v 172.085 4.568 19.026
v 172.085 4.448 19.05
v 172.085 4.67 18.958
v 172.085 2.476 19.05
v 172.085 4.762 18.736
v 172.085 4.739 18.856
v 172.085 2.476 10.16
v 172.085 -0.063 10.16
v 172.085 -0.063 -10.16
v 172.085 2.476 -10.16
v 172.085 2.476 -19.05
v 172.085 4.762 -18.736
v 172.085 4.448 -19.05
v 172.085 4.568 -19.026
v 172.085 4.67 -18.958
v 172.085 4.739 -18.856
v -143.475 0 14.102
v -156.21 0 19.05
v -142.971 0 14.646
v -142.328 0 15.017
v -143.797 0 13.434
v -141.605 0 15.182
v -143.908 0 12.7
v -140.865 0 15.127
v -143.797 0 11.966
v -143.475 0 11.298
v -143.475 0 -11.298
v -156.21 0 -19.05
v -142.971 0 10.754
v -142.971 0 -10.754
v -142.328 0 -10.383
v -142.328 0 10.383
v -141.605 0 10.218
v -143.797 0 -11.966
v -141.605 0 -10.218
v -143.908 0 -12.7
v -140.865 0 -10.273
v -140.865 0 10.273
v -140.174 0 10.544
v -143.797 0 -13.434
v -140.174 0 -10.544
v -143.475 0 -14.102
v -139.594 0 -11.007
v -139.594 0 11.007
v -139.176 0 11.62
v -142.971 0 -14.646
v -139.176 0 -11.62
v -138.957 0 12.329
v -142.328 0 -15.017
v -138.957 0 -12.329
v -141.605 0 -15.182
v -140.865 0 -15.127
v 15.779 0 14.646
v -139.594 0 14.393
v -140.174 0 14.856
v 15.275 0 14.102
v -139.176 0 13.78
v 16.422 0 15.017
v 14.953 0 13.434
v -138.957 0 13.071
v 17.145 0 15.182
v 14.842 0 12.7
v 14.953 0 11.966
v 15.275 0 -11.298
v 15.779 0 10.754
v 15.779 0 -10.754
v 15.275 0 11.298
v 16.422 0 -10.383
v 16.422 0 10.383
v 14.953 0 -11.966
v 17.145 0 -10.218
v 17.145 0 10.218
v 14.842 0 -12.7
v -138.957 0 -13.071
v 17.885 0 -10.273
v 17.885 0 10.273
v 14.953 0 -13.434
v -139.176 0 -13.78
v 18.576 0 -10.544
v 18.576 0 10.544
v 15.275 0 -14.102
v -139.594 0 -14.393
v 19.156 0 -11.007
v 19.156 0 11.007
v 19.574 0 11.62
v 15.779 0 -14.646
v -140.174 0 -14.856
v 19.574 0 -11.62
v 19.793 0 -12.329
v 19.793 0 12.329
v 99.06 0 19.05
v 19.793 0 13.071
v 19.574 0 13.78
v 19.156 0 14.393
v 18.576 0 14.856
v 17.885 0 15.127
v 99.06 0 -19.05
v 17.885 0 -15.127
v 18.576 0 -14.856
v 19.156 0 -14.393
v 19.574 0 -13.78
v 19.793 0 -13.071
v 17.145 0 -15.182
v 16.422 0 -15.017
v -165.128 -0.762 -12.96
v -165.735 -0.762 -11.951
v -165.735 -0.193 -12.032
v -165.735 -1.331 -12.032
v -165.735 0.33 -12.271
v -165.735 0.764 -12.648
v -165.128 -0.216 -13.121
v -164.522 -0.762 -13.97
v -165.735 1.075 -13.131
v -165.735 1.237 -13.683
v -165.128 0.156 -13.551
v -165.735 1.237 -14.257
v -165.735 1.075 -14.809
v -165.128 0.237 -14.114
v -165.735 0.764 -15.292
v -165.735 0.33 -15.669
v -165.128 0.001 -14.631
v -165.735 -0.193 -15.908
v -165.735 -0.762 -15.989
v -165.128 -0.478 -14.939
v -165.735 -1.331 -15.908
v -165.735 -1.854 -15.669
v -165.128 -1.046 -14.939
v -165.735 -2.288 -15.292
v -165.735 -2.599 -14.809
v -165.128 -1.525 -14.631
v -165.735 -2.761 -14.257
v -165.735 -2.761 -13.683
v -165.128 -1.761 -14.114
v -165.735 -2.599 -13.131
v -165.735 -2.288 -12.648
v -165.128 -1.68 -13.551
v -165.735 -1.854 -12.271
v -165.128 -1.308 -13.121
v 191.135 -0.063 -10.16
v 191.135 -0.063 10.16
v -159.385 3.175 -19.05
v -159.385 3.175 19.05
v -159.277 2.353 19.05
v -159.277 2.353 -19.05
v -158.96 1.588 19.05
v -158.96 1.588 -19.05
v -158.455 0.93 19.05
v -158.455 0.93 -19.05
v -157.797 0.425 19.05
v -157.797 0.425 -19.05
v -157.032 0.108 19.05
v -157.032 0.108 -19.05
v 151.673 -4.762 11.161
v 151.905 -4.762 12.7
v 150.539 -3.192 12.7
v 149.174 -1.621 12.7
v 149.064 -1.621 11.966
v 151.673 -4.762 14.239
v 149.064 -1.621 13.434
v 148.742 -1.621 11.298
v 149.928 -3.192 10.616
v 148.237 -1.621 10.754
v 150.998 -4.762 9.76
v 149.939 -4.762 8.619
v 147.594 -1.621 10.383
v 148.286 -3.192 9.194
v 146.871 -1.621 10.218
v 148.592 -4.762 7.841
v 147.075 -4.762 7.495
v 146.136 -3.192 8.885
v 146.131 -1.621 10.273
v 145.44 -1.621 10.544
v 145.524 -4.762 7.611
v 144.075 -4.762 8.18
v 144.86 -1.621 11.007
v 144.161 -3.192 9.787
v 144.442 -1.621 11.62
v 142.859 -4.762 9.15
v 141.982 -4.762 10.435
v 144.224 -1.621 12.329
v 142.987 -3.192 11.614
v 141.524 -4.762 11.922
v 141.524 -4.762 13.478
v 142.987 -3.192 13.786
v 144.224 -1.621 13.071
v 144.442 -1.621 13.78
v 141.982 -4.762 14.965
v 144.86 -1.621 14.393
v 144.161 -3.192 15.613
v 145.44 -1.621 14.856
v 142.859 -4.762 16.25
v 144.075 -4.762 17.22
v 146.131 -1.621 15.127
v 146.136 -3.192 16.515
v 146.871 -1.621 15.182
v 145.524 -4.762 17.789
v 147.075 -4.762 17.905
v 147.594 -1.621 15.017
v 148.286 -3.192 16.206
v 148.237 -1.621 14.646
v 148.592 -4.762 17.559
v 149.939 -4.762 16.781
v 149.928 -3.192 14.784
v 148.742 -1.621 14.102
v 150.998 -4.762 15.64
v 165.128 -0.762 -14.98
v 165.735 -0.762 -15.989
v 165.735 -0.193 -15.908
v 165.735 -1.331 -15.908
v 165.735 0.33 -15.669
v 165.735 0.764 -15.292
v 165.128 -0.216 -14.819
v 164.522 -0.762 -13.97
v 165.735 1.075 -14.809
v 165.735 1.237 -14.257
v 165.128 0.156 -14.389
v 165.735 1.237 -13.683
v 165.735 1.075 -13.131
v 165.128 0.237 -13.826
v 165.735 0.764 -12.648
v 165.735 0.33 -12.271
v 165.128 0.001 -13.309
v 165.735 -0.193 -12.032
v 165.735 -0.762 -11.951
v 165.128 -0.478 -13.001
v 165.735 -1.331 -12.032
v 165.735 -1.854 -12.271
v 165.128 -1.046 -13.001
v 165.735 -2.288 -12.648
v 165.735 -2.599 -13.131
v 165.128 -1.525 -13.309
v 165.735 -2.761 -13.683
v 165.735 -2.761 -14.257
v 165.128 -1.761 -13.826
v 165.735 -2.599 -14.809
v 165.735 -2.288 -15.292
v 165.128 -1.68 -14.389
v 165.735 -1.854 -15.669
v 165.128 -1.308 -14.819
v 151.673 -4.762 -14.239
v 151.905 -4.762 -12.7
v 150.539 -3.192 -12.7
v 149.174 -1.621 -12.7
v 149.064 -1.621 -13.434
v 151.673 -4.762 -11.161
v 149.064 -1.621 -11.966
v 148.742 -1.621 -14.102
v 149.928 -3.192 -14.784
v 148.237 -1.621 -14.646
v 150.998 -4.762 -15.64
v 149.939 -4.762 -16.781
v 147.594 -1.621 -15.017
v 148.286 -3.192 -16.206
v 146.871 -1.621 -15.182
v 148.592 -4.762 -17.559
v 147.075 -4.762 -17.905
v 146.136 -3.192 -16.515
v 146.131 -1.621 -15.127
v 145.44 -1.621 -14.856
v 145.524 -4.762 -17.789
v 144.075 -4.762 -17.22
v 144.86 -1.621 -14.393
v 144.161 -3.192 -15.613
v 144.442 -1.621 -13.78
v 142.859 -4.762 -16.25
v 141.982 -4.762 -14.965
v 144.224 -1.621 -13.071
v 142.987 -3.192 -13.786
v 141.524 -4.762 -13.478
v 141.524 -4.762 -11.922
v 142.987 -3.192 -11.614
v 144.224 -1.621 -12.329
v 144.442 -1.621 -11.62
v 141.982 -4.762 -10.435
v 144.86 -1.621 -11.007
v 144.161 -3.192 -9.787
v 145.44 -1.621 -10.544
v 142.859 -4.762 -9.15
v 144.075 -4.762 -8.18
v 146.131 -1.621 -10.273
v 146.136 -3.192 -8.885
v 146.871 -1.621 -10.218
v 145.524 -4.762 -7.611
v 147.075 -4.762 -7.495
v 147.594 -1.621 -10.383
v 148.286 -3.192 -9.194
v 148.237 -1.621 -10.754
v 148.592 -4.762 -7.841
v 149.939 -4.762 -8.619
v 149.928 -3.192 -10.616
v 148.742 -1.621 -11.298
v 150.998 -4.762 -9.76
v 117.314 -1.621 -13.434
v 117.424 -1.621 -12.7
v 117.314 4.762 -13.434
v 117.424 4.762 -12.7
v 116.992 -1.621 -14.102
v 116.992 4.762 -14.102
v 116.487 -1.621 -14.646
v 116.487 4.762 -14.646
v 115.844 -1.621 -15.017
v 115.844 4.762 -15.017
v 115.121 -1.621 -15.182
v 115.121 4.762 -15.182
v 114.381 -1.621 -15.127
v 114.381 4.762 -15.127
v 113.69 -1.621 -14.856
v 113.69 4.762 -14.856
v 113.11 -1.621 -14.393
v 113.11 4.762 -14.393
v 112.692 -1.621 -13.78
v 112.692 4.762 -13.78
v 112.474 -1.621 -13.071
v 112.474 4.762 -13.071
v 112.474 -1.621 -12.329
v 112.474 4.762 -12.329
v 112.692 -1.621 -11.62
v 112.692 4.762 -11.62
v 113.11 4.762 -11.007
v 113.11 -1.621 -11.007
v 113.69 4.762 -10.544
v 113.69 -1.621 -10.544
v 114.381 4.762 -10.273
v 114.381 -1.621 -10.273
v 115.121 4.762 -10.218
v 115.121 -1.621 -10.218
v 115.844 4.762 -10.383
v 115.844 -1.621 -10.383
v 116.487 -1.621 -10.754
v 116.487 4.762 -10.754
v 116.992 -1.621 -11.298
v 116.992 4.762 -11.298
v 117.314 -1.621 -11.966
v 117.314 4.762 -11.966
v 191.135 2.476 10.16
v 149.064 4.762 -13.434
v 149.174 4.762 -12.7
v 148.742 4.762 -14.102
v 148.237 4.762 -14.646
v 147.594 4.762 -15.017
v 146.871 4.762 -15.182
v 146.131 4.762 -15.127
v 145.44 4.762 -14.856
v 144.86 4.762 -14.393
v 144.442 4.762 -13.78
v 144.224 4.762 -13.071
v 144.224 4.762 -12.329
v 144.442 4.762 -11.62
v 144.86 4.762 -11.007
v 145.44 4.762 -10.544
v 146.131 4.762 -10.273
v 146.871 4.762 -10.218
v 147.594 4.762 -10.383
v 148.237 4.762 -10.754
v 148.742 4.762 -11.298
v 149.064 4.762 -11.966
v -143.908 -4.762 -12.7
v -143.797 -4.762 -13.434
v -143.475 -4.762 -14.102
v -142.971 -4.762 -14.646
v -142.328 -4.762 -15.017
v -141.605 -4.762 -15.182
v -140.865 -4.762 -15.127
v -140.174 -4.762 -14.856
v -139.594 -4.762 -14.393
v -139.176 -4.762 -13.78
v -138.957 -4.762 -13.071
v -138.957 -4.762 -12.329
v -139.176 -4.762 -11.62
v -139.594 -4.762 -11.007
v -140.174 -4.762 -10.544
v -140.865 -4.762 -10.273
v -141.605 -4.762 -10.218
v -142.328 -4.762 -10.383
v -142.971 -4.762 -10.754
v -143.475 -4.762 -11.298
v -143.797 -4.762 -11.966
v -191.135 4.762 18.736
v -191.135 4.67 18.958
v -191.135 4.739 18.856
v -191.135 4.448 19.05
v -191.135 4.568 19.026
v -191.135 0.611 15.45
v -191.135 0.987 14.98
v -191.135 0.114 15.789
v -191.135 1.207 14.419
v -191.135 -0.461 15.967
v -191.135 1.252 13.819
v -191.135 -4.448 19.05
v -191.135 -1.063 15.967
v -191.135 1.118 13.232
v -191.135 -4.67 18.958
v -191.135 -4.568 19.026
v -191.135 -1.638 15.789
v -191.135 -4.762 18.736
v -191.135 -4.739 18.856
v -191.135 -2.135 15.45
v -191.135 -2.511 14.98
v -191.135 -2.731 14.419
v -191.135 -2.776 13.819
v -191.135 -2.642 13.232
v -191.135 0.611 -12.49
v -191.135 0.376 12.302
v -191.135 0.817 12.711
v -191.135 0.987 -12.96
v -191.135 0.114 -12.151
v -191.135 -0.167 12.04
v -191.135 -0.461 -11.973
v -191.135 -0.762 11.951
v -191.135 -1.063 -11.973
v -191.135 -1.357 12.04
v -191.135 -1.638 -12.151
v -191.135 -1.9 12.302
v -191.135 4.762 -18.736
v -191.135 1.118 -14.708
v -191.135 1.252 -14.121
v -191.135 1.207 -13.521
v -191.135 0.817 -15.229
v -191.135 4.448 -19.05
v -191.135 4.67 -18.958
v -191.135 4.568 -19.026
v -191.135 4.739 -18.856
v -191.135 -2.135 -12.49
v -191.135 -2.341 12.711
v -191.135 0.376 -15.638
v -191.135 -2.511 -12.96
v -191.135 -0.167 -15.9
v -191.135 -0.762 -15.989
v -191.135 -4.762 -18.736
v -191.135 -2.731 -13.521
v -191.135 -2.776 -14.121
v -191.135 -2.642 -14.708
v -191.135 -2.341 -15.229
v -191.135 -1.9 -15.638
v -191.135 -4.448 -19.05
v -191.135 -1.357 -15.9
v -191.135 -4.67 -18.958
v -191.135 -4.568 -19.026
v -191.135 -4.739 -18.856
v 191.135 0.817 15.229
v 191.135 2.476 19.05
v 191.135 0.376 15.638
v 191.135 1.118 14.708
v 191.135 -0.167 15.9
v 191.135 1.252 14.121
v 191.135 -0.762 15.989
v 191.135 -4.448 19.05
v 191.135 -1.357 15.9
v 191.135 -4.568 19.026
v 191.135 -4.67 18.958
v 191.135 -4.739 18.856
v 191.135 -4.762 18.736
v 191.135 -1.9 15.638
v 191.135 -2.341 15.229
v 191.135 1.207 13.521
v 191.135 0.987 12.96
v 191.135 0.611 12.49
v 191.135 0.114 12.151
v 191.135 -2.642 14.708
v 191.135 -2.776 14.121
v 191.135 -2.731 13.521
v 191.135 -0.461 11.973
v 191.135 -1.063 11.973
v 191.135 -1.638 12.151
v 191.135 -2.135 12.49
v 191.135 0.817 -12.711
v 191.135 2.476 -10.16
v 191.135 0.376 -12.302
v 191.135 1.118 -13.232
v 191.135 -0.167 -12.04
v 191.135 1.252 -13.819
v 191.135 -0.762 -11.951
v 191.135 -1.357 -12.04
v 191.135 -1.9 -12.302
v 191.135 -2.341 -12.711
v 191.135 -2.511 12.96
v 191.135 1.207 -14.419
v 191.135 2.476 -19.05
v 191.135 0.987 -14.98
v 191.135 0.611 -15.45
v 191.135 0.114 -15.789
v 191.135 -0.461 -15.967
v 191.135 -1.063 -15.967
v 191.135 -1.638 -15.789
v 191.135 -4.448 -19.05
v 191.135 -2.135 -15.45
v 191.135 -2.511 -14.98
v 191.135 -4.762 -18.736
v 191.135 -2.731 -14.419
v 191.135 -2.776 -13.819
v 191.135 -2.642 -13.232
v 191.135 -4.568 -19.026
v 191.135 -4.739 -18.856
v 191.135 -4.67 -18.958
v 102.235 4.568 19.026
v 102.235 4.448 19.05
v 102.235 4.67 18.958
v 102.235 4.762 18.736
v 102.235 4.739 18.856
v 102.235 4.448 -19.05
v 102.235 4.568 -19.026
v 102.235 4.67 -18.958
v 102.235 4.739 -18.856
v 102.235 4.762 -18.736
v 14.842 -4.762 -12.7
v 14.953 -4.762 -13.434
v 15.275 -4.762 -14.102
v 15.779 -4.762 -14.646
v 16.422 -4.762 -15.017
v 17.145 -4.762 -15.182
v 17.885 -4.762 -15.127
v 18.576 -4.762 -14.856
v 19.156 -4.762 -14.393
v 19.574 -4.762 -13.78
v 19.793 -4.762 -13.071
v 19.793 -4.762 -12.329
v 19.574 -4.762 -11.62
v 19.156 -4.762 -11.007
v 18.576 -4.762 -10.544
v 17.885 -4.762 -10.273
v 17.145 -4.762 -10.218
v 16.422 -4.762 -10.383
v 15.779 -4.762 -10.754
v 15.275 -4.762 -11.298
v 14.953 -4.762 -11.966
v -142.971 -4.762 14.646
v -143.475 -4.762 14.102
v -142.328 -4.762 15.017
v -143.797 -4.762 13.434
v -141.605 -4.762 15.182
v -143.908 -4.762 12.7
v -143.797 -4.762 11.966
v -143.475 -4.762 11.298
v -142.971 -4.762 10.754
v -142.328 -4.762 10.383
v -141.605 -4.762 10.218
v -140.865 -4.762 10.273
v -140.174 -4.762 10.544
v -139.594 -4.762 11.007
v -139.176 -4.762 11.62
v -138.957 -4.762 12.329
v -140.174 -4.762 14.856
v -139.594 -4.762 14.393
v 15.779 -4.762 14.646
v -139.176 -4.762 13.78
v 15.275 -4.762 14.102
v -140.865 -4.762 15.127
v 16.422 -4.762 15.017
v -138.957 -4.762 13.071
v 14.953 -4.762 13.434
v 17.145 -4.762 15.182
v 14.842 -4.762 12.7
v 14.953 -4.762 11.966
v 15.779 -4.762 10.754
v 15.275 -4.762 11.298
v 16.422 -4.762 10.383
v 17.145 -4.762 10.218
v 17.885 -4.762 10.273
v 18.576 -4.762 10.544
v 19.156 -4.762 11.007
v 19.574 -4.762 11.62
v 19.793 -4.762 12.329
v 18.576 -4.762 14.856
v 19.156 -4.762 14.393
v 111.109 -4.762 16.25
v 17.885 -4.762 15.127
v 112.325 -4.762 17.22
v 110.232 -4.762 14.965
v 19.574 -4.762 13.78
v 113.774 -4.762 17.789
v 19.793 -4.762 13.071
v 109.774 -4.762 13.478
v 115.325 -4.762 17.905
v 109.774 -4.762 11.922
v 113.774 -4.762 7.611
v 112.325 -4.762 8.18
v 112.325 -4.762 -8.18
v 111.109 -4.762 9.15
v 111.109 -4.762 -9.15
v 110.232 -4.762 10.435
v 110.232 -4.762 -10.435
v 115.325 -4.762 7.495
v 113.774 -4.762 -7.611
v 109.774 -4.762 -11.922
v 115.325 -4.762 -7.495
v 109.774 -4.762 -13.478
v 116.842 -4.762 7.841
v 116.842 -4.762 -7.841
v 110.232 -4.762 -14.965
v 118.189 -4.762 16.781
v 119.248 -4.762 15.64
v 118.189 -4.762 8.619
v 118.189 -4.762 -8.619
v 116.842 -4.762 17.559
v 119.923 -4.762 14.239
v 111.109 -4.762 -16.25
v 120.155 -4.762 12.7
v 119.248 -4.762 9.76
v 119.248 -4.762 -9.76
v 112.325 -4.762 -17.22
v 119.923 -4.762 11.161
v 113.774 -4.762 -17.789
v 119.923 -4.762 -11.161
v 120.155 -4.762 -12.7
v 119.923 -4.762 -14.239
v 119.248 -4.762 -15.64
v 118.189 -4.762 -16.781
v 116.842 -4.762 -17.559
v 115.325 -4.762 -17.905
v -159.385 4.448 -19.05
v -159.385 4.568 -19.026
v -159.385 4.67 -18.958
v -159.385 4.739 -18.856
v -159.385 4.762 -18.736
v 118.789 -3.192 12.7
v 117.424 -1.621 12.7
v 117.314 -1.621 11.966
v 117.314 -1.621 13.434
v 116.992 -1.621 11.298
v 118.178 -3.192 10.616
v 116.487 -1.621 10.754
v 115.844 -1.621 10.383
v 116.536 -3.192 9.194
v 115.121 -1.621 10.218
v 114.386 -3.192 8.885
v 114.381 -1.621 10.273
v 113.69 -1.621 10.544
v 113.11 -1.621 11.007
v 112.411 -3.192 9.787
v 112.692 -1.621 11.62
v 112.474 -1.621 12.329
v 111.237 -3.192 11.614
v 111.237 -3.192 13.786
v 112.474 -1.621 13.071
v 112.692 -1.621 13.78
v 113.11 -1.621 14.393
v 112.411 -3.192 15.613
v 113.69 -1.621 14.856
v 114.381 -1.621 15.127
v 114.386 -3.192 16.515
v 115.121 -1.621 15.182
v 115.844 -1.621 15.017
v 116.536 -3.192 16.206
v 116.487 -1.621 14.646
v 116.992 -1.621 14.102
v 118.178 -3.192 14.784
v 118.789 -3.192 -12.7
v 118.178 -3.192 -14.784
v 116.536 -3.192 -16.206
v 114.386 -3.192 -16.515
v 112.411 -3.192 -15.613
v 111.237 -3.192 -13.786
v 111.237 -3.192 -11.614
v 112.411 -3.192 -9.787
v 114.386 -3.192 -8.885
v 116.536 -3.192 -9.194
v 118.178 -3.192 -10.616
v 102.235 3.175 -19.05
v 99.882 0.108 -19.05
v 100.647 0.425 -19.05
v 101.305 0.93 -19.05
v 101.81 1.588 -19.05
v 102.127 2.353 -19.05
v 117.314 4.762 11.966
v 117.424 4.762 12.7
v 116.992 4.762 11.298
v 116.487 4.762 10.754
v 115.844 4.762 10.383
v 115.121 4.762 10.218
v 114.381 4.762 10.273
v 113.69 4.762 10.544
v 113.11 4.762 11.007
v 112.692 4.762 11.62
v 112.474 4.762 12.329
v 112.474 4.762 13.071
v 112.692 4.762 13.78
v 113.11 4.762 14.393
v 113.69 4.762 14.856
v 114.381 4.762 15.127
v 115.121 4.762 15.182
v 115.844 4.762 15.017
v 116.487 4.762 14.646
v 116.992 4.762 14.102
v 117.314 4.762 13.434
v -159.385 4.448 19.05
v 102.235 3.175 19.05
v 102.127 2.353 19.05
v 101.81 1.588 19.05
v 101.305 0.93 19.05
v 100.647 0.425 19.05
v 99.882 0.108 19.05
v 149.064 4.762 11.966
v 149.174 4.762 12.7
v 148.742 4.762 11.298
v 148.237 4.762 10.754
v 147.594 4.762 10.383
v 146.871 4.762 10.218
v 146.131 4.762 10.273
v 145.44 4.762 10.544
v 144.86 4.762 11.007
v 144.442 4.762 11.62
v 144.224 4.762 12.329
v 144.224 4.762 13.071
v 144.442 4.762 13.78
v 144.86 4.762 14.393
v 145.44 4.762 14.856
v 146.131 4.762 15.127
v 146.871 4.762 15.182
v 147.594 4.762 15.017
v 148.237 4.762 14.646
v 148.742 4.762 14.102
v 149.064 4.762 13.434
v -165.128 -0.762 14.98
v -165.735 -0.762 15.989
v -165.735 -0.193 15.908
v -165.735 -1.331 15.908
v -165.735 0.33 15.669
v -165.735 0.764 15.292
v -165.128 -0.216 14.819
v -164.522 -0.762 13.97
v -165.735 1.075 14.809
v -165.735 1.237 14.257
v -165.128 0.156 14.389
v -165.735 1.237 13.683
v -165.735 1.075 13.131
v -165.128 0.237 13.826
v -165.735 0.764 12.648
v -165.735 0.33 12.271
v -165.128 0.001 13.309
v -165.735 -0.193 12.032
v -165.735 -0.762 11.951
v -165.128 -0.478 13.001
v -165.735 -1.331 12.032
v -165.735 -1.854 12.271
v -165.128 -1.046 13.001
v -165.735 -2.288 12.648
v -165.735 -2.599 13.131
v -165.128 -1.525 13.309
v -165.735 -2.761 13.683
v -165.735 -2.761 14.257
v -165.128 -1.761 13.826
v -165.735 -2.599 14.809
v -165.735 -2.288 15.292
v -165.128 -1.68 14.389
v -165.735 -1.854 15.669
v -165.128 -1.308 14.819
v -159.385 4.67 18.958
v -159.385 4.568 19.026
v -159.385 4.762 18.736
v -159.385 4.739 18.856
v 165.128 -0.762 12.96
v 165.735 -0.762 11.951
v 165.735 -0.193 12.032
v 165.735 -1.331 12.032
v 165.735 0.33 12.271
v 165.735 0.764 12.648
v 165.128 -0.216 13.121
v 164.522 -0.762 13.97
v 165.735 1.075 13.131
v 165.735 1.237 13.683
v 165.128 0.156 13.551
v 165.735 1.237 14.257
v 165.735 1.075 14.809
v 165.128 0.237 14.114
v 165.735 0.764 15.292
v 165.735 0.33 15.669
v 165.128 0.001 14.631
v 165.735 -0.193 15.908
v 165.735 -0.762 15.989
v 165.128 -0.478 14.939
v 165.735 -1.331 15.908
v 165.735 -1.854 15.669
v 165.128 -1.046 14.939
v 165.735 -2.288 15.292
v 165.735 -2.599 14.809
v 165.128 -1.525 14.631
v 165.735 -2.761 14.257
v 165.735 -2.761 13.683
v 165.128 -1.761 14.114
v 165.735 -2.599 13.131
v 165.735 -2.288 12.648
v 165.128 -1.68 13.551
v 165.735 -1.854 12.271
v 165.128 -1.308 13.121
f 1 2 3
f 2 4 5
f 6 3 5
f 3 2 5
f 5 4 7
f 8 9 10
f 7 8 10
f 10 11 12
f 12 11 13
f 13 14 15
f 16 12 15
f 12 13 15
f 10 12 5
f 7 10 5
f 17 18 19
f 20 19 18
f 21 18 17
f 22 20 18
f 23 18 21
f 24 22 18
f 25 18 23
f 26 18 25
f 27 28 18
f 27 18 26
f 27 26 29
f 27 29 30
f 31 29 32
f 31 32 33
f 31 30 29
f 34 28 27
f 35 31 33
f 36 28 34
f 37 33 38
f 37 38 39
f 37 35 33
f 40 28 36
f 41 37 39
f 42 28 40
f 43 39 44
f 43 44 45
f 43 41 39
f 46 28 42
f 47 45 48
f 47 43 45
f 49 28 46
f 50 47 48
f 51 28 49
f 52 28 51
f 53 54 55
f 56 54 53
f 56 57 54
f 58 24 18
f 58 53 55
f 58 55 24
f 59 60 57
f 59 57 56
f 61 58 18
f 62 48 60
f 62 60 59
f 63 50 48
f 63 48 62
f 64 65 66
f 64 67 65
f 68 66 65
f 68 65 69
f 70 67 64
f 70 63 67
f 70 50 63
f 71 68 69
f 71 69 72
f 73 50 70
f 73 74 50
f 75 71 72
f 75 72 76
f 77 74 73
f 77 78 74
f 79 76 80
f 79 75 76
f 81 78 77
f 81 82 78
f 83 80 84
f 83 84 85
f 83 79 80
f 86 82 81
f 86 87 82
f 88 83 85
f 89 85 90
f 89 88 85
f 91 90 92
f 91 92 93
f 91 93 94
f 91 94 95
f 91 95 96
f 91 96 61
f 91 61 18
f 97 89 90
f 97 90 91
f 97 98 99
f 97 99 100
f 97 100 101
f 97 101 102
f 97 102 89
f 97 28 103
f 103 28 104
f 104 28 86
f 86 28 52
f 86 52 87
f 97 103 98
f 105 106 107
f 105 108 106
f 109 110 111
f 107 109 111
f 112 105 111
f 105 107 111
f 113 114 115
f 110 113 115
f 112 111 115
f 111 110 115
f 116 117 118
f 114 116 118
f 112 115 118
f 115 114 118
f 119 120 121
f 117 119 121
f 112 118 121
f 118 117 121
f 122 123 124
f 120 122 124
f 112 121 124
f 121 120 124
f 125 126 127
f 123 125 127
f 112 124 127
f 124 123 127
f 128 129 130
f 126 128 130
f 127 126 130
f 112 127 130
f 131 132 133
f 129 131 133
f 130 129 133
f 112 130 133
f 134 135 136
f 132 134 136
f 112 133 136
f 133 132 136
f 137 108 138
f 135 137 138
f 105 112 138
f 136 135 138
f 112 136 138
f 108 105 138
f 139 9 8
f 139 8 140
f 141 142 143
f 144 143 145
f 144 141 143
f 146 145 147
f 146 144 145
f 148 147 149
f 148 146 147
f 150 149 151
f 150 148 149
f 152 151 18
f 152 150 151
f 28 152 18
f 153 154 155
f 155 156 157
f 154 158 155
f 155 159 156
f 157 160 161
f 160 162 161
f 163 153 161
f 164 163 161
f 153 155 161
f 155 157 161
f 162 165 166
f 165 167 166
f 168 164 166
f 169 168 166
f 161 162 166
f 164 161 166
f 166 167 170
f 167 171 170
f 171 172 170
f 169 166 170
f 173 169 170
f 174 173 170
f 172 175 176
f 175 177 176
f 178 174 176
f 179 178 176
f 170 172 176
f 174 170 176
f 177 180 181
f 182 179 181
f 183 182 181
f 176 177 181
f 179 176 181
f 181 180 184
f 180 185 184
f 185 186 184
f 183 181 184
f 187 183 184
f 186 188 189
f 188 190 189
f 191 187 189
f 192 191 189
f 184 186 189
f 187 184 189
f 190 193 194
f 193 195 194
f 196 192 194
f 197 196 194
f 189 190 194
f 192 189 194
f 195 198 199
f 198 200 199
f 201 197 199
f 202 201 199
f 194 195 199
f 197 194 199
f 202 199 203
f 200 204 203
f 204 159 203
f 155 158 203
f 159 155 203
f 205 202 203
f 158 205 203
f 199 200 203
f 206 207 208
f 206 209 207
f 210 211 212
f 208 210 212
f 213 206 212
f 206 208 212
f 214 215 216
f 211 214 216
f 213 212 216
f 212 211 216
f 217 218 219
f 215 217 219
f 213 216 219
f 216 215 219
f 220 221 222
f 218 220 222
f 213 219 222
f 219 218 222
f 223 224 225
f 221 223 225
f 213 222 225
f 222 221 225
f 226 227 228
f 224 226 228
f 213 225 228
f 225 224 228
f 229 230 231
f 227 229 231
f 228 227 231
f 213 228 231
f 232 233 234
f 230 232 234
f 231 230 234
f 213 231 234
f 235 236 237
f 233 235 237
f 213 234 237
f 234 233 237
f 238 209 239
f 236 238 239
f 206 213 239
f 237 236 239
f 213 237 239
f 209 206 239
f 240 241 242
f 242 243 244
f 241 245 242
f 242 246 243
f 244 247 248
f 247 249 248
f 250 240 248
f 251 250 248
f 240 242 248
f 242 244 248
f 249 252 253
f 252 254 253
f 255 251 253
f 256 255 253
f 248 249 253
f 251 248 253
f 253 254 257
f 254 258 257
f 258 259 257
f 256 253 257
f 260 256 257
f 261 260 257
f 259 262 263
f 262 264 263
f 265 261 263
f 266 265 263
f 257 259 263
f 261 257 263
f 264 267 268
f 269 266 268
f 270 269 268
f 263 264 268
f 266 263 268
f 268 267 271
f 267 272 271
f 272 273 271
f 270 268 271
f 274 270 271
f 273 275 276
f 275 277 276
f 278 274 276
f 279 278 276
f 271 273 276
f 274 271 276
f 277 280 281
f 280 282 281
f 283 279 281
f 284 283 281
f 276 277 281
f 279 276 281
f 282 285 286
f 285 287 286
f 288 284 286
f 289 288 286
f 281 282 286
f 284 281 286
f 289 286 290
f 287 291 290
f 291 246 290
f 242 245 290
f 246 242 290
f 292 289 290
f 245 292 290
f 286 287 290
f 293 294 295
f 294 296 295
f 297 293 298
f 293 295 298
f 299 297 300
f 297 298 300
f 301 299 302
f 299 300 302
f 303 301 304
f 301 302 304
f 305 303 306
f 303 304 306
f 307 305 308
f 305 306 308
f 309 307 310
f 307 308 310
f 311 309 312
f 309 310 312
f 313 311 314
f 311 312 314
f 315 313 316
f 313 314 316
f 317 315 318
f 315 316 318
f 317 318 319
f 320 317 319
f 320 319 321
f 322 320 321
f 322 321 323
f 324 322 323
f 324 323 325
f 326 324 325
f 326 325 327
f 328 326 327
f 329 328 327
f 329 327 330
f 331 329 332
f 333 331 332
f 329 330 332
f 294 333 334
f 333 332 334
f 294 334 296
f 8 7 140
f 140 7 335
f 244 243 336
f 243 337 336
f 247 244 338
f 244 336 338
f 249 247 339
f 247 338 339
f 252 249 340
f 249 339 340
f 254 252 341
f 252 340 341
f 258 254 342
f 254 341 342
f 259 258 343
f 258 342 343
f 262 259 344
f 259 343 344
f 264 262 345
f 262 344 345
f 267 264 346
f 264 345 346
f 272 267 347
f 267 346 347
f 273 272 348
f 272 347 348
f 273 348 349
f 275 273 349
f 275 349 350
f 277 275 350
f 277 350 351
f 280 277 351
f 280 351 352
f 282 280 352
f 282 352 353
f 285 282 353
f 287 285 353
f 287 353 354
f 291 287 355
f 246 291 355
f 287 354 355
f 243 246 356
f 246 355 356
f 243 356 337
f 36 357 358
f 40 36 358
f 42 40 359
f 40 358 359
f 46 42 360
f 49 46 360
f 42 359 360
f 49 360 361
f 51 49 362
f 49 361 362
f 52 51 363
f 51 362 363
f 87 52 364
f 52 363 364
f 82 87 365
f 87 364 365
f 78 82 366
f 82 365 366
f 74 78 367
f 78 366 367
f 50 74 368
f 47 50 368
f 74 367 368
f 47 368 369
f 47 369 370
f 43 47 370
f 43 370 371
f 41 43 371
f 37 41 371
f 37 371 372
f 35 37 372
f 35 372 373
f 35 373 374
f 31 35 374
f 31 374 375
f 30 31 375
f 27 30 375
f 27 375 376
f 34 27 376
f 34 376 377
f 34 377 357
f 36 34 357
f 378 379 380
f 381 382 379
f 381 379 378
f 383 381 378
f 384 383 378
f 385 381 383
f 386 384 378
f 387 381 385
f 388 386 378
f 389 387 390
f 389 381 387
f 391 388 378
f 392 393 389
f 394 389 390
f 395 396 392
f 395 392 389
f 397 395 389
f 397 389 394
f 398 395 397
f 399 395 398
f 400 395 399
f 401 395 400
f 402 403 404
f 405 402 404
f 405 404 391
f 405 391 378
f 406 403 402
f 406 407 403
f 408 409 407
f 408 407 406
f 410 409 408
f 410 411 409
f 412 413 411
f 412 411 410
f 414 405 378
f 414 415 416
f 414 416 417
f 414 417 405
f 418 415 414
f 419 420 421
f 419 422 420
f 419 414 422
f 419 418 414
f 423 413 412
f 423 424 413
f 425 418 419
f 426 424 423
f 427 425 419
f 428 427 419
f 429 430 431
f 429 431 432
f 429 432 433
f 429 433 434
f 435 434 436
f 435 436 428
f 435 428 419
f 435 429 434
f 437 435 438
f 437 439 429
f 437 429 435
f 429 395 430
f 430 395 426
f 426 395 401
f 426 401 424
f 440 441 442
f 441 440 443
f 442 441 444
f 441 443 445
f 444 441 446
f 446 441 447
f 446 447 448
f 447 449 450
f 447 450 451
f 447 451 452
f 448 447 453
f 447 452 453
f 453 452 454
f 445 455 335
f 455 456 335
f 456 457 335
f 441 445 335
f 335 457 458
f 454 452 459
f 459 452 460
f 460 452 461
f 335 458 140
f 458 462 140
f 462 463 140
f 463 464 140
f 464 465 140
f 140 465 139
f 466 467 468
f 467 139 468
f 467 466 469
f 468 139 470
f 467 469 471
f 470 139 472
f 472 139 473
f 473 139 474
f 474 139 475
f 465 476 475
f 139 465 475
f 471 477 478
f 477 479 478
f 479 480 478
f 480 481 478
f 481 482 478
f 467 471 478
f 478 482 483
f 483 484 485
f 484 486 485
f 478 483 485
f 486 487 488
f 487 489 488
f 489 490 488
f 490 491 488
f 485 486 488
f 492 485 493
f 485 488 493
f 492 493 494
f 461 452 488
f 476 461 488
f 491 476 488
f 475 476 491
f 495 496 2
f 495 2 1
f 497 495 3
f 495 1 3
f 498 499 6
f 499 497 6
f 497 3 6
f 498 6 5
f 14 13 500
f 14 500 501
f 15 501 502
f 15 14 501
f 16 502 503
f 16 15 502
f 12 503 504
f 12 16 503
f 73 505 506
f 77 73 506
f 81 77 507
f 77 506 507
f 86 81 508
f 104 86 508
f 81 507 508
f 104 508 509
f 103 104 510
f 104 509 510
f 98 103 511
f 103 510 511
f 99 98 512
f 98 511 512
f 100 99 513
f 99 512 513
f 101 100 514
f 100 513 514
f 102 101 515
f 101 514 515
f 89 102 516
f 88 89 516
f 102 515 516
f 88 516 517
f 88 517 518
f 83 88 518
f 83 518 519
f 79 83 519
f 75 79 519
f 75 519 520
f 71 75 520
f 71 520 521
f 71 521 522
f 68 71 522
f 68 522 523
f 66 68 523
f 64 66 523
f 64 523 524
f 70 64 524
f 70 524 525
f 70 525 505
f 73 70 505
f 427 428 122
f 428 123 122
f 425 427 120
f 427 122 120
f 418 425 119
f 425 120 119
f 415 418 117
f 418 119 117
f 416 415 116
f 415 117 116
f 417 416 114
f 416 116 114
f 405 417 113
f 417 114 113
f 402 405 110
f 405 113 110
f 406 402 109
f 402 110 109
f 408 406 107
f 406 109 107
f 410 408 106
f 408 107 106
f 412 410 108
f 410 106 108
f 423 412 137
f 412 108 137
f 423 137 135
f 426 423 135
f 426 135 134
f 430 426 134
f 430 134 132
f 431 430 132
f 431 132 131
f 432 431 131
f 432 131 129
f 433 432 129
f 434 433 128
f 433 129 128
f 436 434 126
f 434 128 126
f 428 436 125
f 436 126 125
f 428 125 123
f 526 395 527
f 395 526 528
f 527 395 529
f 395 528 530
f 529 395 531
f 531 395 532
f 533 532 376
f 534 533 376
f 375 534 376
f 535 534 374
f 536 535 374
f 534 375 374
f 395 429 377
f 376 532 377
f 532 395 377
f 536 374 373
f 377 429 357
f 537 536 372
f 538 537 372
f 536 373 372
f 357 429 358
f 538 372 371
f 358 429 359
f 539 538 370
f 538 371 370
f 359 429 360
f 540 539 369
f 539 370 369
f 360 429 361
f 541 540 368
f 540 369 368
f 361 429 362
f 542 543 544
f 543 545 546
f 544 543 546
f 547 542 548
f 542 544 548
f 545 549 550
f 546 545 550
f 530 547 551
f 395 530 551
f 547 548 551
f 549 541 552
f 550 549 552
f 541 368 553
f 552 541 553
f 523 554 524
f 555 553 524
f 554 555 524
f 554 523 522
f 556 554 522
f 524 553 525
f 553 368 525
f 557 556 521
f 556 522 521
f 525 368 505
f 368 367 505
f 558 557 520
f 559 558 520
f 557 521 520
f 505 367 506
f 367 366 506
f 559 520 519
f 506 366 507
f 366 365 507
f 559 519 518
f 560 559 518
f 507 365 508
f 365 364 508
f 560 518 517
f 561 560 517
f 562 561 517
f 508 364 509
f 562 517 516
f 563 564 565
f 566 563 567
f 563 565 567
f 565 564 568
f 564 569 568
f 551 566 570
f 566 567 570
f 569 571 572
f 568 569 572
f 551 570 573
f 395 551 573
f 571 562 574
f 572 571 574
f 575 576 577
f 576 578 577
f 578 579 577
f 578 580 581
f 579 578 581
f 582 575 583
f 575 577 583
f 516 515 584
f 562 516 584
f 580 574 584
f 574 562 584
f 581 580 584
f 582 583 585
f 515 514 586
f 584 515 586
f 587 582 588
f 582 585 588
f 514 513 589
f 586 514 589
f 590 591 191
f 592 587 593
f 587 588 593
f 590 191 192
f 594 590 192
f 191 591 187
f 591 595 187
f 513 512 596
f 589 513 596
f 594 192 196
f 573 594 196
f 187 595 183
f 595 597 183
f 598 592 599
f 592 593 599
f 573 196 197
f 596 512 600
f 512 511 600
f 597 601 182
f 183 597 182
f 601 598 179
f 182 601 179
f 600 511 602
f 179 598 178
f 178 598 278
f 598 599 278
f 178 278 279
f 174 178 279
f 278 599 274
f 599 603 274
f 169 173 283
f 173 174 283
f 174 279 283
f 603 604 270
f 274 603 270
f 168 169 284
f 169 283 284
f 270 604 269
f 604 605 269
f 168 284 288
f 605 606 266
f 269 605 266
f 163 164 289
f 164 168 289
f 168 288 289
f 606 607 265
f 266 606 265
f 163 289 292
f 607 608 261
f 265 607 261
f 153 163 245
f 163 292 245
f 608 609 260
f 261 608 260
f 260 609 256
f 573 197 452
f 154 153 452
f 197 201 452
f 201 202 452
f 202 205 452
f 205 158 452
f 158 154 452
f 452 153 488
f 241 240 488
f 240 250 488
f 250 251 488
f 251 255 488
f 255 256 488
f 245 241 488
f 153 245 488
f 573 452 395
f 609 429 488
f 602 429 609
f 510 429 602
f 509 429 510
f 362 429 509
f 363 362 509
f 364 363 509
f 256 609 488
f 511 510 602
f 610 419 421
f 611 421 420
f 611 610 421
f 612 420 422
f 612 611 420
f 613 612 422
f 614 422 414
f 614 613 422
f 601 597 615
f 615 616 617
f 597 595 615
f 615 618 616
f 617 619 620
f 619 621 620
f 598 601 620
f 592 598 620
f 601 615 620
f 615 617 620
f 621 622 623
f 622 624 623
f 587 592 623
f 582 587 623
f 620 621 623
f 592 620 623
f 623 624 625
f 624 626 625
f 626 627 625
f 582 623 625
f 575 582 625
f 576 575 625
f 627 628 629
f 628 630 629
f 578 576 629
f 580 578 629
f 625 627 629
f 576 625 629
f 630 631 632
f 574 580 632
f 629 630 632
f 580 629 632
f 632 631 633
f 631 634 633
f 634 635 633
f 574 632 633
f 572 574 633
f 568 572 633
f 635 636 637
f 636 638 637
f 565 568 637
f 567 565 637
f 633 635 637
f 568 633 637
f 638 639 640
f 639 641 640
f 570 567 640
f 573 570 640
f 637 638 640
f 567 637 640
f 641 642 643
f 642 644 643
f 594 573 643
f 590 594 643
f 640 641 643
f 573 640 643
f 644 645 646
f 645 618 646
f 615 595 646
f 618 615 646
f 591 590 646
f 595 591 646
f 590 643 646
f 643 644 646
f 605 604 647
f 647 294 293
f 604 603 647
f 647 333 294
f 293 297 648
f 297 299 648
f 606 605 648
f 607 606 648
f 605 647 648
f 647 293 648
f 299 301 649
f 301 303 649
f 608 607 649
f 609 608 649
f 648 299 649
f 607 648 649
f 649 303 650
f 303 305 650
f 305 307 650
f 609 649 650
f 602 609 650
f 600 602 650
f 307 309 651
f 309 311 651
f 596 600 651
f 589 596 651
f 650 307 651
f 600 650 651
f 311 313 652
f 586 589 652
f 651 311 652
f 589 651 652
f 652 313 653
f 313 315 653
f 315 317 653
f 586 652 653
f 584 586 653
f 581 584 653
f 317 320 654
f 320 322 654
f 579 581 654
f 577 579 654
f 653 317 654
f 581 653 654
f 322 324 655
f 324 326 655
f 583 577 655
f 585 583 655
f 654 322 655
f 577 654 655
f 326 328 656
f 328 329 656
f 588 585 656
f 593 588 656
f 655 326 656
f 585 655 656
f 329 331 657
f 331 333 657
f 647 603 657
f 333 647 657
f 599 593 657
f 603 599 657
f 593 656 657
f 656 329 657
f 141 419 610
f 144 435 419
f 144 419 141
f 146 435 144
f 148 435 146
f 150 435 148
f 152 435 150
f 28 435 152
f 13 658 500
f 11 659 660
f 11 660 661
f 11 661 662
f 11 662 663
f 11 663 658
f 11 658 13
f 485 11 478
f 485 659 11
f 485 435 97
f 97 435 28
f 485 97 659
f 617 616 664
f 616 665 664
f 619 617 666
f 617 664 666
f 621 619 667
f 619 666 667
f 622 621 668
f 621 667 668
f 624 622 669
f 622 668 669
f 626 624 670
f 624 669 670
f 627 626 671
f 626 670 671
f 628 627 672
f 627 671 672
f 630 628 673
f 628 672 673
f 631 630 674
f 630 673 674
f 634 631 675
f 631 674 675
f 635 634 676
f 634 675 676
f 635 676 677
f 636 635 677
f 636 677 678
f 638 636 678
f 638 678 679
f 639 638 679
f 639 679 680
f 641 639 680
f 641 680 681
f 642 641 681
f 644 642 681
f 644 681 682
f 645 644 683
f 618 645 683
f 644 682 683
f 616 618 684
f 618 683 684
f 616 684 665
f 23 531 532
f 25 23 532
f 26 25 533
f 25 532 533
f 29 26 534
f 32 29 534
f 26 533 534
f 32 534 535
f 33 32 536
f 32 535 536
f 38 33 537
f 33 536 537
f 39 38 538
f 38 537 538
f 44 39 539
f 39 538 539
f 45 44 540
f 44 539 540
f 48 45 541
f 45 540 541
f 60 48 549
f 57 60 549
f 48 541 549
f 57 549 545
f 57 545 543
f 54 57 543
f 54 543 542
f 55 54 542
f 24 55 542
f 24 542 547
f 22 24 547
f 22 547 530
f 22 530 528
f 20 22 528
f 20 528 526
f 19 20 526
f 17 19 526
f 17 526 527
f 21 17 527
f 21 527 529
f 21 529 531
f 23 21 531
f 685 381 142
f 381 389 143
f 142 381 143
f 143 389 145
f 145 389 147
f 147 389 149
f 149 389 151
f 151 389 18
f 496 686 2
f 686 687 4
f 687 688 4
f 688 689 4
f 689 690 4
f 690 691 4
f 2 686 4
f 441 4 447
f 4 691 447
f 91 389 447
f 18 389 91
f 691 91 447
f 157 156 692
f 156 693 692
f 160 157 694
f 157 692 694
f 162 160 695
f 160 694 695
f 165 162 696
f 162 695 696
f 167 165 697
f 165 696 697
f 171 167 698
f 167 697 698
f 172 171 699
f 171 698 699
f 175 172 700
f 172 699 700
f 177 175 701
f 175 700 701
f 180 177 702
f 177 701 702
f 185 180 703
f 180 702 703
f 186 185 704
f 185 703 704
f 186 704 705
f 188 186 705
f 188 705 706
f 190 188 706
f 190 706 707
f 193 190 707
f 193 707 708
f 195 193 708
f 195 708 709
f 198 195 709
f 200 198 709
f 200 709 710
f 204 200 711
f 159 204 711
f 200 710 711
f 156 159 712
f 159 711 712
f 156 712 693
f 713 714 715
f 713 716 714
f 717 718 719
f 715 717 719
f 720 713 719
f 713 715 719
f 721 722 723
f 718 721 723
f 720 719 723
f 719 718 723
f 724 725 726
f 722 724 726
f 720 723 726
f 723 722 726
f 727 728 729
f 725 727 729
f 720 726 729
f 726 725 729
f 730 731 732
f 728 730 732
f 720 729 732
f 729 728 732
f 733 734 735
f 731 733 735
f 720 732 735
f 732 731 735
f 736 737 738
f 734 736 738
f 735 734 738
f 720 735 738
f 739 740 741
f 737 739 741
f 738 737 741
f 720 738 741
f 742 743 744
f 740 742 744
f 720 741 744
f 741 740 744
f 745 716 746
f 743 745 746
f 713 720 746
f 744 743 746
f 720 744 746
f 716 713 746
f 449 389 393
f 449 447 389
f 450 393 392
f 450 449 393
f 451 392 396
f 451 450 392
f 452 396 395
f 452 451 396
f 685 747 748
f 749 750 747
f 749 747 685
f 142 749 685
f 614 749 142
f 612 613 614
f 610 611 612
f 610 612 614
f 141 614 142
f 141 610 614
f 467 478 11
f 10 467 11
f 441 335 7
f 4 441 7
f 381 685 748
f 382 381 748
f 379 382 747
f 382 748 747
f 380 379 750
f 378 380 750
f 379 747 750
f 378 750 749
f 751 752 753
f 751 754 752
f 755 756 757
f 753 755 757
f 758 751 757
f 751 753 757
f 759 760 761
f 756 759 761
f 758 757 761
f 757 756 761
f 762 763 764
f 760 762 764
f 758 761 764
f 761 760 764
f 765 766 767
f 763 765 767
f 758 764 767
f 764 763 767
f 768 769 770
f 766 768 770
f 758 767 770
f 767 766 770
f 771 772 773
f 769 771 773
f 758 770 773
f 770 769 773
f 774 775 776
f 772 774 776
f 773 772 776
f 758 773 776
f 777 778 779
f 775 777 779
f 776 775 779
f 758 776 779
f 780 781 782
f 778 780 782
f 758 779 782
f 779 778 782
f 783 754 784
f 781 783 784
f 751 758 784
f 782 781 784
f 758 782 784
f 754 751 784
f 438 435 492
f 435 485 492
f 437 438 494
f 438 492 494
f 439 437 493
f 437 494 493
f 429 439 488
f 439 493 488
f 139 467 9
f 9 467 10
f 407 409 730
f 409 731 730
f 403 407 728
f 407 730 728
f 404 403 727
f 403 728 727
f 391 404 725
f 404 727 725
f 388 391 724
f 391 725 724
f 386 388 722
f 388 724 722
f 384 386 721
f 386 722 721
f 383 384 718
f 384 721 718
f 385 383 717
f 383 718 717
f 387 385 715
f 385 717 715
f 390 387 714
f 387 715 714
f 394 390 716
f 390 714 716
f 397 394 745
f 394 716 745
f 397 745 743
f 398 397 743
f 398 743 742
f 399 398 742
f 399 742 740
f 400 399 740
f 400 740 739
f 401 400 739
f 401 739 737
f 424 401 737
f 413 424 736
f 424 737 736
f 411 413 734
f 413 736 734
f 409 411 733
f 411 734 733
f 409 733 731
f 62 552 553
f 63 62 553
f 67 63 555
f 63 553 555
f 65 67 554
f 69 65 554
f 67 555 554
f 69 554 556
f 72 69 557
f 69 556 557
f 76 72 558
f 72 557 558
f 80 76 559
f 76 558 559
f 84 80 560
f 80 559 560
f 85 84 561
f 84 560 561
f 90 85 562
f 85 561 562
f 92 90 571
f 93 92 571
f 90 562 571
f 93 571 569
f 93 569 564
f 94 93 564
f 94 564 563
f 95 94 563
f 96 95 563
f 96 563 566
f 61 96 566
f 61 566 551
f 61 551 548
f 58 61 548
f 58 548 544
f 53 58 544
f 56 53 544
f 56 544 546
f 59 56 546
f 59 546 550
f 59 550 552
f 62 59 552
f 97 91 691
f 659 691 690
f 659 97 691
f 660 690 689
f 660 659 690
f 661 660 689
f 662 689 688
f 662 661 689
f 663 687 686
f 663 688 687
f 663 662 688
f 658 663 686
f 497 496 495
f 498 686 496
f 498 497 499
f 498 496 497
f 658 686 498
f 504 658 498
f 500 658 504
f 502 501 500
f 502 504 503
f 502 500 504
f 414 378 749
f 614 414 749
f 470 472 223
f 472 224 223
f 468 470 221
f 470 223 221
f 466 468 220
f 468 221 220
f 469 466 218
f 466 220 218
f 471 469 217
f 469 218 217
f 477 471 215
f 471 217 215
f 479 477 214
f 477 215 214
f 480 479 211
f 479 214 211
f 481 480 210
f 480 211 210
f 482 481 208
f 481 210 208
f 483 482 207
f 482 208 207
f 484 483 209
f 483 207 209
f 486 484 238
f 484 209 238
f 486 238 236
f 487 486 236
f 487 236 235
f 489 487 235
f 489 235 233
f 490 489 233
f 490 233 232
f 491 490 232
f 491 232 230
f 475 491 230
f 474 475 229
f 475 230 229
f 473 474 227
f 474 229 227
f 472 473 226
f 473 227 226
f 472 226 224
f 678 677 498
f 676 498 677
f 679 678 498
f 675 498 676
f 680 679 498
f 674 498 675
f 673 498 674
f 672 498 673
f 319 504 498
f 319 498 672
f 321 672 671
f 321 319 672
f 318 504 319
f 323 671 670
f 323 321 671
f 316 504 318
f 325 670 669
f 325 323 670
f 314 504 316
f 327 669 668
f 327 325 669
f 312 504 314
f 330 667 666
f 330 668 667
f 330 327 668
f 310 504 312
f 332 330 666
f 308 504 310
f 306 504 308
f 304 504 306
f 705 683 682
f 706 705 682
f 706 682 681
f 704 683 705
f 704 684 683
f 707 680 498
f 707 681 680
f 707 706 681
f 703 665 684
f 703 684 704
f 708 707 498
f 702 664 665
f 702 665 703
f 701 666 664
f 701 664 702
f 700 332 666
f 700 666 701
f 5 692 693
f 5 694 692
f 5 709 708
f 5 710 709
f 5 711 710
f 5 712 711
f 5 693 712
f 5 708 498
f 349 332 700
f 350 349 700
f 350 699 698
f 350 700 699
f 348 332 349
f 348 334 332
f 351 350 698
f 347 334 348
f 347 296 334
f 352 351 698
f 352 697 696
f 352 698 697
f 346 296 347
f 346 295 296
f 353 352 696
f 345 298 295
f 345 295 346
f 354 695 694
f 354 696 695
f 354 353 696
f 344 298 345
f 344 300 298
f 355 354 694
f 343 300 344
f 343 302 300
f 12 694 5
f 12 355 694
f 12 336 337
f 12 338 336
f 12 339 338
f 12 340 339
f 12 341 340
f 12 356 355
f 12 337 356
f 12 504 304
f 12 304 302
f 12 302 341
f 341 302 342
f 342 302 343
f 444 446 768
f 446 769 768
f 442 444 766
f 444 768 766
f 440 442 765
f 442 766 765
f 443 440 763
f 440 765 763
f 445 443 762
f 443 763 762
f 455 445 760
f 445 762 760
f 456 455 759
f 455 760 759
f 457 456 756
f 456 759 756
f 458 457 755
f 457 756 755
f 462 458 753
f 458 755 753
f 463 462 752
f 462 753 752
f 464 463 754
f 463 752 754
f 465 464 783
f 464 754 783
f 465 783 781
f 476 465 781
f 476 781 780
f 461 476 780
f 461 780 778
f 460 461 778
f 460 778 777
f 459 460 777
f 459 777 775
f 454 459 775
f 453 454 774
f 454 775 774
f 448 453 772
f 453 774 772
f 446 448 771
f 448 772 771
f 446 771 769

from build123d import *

# Parameters (mm, degrees)
BOSS_EXTRUDE1_DEPTH              = 4.7625
BOSS_EXTRUDE1_DEPTH_BACK         = 4.7625
SKETCH3_W                        = 382.27
SKETCH3_H                        = 38.1
FILLET1_R                        = 0.314325
TAP_DRILL_FOR_10_32_TAP1_D       = 4.0386
TAP_DRILL_FOR_10_32_TAP1_DEPTH   = 25.4
TAP_DRILL_FOR_10_32_TAP1_TIP     = 1.213317848
TAP_DRILL_FOR_10_32_TAP2_D       = 4.0386
TAP_DRILL_FOR_10_32_TAP2_DEPTH   = 25.4
TAP_DRILL_FOR_10_32_TAP2_TIP     = 1.213317848
SKETCH10_W                       = 19.05
SKETCH10_H                       = 2.286
CUT_EXTRUDE1_DEPTH               = 195.953531979
F_10_CLEARANCE_HOLE1_D           = 4.9784
F_10_CLEARANCE_HOLE1_CSINK_D     = 10.4394
F_10_CLEARANCE_HOLE1_CSINK_ANGLE = 82
CUT_EXTRUDE2_DEPTH               = 2.54
F_10_CLEARANCE_HOLE2_D           = 4.9784


with BuildPart() as part:
    # Sketch3 → Boss-Extrude1 (new, two sides: drawn at the far end of the back side and taken through both)
    with BuildSketch(Plane(origin=(0, 0, 0), x_dir=(1, 0, 0), z_dir=(0, 1, 0)).offset(-BOSS_EXTRUDE1_DEPTH_BACK)):
        Rectangle(SKETCH3_W, SKETCH3_H)
    extrude(amount=BOSS_EXTRUDE1_DEPTH + BOSS_EXTRUDE1_DEPTH_BACK)

    # Fillet1
    fillet1_edges = [part.edges().sort_by_distance(p)[0] for p in [
        (0, 4.7625, 19.05),
        (0, -4.7625, -19.05),
        (0, 4.7625, -19.05),
        (0, -4.7625, 19.05),
    ]]
    fillet(fillet1_edges, radius=FILLET1_R)

    # Tap Drill for #10-32 Tap1
    with Locations(Plane.ZY.offset(191.135)):
        with Locations((-13.97, -0.762), (13.97, -0.762)):
            Hole(TAP_DRILL_FOR_10_32_TAP1_D / 2, depth=TAP_DRILL_FOR_10_32_TAP1_DEPTH)
            with Locations((0, 0, -(TAP_DRILL_FOR_10_32_TAP1_DEPTH + TAP_DRILL_FOR_10_32_TAP1_TIP / 2))):  # 118° drill point
                Cone(0, TAP_DRILL_FOR_10_32_TAP1_D / 2, TAP_DRILL_FOR_10_32_TAP1_TIP, mode=Mode.SUBTRACT)

    # Tap Drill for #10-32 Tap2
    with Locations(Plane(origin=(191.135, 0, 0), x_dir=(0, 0, -1), z_dir=(1, 0, 0))):
        with Locations((-13.97, -0.762), (13.97, -0.762)):
            Hole(TAP_DRILL_FOR_10_32_TAP2_D / 2, depth=TAP_DRILL_FOR_10_32_TAP2_DEPTH)
            with Locations((0, 0, -(TAP_DRILL_FOR_10_32_TAP2_DEPTH + TAP_DRILL_FOR_10_32_TAP2_TIP / 2))):  # 118° drill point
                Cone(0, TAP_DRILL_FOR_10_32_TAP2_D / 2, TAP_DRILL_FOR_10_32_TAP2_TIP, mode=Mode.SUBTRACT)

    # Sketch10 → Cut-Extrude1 (cut, through all)
    with BuildSketch(Plane(origin=(0, 0, -19.05), x_dir=(-1, 0, 0), z_dir=(0, 0, -1))):
        with BuildLine():
            Line((159.385, 4.7625), (159.385, 3.175))
            ThreePointArc((159.385, 3.175), (158.45506403, 0.92993597), (156.21, 0))
            Line((156.21, 0), (-99.06, 0))
            ThreePointArc((-99.06, 0), (-101.30506403, 0.92993597), (-102.235, 3.175))
            Line((-102.235, 3.175), (-102.235, 4.7625))
            Line((-102.235, 4.7625), (159.385, 4.7625))
        make_face()
        with Locations((-181.61, 3.6195)):
            Rectangle(SKETCH10_W, SKETCH10_H)
    extrude(amount=-CUT_EXTRUDE1_DEPTH, mode=Mode.SUBTRACT)

    # #10 Clearance Hole1 (through all)
    with Locations(Plane(origin=(0, -4.7625, 0), x_dir=(-1, 0, 0), z_dir=(0, -1, 0))):
        with Locations((-114.935, 12.7), (-146.685, 12.7), (-146.685, -12.7), (-114.935, -12.7)):
            CounterSinkHole(F_10_CLEARANCE_HOLE1_D / 2, F_10_CLEARANCE_HOLE1_CSINK_D / 2, counter_sink_angle=F_10_CLEARANCE_HOLE1_CSINK_ANGLE)

    # Sketch17 → Cut-Extrude2 (cut)
    with BuildSketch(Plane(origin=(0, 2.4765, 0), x_dir=(1, 0, 0), z_dir=(0, 1, 0))):
        Polygon((191.135, 0), (191.135, 10.16), (172.085, 10.16), (172.085, -10.16), (191.135, -10.16), align=None)
    extrude(amount=-CUT_EXTRUDE2_DEPTH, mode=Mode.SUBTRACT)

    # #10 Clearance Hole2 (through all)
    with Locations(Plane(origin=(0, 0, 0), x_dir=(1, 0, 0), z_dir=(0, 1, 0))):
        with Locations((-141.418780002, 12.7), (-141.418780002, -12.7), (17.331219998, 12.7), (17.331219998, -12.7)):
            Hole(F_10_CLEARANCE_HOLE2_D / 2)


solid = part.part
